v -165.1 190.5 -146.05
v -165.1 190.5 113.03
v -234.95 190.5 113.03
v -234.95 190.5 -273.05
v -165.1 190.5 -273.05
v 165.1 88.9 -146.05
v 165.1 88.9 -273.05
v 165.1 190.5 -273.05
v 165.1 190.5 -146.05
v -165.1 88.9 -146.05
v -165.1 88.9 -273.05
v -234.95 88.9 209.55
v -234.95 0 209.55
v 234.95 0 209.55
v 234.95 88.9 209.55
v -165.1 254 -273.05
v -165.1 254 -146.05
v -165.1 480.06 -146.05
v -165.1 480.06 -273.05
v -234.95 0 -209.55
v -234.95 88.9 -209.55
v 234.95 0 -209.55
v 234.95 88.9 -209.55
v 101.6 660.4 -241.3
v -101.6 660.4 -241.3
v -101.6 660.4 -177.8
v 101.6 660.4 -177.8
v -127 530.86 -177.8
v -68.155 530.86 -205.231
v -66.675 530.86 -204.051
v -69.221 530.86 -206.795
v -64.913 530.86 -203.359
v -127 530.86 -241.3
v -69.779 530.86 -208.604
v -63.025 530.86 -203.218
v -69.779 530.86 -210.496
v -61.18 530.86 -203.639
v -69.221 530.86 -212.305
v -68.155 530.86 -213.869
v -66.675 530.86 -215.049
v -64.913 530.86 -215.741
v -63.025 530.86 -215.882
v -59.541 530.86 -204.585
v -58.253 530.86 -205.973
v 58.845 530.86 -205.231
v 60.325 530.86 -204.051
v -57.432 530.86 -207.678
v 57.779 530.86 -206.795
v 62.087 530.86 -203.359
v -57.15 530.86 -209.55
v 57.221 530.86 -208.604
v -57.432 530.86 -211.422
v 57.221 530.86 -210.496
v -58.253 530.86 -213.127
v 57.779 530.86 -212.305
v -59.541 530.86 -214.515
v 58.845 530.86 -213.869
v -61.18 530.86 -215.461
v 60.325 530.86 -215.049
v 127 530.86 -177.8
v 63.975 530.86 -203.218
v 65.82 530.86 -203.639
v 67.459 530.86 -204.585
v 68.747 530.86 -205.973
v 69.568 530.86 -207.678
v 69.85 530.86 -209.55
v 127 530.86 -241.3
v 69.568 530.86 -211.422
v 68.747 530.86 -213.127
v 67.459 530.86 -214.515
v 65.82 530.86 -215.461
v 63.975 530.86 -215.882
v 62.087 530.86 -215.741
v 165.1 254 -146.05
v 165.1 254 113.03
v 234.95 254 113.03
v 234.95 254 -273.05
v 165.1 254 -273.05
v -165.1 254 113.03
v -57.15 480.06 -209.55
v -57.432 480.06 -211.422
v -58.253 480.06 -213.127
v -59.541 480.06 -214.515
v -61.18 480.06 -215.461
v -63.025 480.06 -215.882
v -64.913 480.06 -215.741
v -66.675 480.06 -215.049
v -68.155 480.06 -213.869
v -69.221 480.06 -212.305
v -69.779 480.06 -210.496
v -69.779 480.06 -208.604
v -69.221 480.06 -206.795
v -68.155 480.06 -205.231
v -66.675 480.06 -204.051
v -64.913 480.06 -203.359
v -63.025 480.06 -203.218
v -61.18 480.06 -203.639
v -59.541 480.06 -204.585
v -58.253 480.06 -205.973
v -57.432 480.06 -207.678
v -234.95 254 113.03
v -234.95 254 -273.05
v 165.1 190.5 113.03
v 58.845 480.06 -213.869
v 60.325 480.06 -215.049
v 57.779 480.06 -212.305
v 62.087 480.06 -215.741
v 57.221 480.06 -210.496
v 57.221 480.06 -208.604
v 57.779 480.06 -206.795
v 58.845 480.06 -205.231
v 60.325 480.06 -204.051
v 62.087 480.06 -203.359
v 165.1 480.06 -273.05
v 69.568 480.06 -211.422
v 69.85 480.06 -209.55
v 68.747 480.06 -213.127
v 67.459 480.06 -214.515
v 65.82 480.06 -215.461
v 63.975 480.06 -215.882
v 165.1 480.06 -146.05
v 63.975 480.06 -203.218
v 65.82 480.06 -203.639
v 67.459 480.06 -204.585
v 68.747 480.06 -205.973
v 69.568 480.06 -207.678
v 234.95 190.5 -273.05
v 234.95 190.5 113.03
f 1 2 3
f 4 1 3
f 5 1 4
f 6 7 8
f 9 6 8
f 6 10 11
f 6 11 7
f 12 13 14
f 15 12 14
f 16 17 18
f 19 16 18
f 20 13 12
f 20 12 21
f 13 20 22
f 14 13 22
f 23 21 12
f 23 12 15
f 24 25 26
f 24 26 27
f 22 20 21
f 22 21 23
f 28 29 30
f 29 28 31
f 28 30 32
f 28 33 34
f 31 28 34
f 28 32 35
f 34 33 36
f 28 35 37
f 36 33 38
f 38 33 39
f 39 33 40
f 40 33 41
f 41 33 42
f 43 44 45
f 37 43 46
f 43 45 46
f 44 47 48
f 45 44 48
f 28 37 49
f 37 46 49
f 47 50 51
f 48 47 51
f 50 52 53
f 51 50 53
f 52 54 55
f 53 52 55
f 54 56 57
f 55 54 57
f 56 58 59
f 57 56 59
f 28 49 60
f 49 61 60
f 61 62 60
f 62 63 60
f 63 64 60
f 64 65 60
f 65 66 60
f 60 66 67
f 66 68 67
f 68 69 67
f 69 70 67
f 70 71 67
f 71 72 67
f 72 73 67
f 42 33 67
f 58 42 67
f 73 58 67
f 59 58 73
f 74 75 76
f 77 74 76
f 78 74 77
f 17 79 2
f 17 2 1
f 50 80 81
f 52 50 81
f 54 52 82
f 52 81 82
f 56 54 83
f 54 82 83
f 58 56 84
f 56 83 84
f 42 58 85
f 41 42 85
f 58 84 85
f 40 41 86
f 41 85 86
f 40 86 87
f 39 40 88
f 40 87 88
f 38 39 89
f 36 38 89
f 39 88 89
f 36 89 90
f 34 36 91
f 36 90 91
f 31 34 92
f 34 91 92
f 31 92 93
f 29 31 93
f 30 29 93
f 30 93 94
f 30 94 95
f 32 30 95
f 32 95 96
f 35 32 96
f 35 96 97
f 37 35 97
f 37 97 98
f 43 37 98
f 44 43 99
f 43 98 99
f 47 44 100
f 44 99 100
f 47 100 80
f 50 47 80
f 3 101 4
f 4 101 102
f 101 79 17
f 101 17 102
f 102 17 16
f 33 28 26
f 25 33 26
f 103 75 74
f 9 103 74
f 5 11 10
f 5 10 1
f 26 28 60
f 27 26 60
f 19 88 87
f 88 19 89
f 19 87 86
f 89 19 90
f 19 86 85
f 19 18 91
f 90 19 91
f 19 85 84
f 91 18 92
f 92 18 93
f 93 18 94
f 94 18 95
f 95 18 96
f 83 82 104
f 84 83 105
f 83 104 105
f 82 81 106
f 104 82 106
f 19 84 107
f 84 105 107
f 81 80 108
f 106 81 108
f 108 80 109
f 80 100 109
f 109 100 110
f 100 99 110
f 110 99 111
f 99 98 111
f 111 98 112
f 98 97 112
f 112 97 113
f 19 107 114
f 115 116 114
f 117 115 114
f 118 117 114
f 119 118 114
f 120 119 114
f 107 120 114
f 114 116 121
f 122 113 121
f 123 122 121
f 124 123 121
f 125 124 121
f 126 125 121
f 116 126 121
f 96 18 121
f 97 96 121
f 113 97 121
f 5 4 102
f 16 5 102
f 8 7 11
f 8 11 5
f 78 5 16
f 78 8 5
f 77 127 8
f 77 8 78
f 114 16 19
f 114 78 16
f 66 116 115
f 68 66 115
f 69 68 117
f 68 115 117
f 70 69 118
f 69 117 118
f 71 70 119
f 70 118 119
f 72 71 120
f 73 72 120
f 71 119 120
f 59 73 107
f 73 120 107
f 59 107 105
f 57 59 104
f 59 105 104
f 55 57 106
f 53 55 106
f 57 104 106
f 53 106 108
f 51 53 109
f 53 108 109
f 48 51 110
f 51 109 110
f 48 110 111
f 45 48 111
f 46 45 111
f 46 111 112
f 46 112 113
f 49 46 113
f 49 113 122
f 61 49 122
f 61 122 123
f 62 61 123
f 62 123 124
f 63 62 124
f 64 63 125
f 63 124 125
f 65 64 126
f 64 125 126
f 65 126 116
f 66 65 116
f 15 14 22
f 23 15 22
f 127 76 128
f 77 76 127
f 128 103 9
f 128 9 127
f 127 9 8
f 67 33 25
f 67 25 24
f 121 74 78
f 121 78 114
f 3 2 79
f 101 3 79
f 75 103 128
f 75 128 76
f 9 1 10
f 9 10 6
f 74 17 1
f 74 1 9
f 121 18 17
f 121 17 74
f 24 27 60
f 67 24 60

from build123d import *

# Parameters (mm, degrees)
SKETCH1_W           = 469.9
SKETCH1_H           = 419.1
BOSS_EXTRUDE1_DEPTH = 88.9
SKETCH2_W           = 330.2
SKETCH2_H           = 391.16
BOSS_EXTRUDE2_DEPTH = 63.5
SKETCH3_W           = 386.08
SKETCH3_H           = 63.5
BOSS_EXTRUDE3_DEPTH = 69.85
SKETCH4_R           = 6.35
BOSS_EXTRUDE4_DEPTH = 50.8
SKETCH5_W           = 254
SKETCH5_H           = 63.5
BOSS_EXTRUDE5_DEPTH = 129.54
CUT_EXTRUDE1_DEPTH  = 129.54


with BuildPart() as part:
    # Sketch1 → Boss-Extrude1 (new body)
    with BuildSketch(Plane(origin=(0, 0, 0), x_dir=(1, 0, 0), z_dir=(0, 1, 0))):
        Rectangle(SKETCH1_W, SKETCH1_H)
    extrude(amount=BOSS_EXTRUDE1_DEPTH)


with BuildPart() as body_2:
    # Sketch2 → Boss-Extrude2 (new body, symmetric)
    with BuildSketch(Plane.XY.offset(-209.55)):
        with Locations((0, 284.48)):
            Rectangle(SKETCH2_W, SKETCH2_H)
    extrude(amount=BOSS_EXTRUDE2_DEPTH, both=True)

    # Sketch3 → Boss-Extrude3 (add)
    with BuildSketch(Plane(origin=(165.1, 0, 0), x_dir=(0, 0, -1), z_dir=(1, 0, 0))):
        with Locations((80.01, 222.25)):
            Rectangle(SKETCH3_W, SKETCH3_H)
    boss_extrude3 = extrude(amount=BOSS_EXTRUDE3_DEPTH)

    # Mirror1: Boss-Extrude3 across plane
    add(boss_extrude3.mirror(Plane(origin=(0, 0, 0), x_dir=(0, 0, 1), z_dir=(1, 0, 0))))

    # Sketch4 → Boss-Extrude4 (add)
    with BuildSketch(Plane(origin=(0, 480.06, 0), x_dir=(1, 0, 0), z_dir=(0, 1, 0))):
        with Locations((-63.5, 209.55)):
            Circle(SKETCH4_R)
        with Locations((63.5, 209.55)):
            Circle(SKETCH4_R)
    extrude(amount=BOSS_EXTRUDE4_DEPTH)

    # Sketch5 → Boss-Extrude5 (add)
    with BuildSketch(Plane(origin=(0, 530.86, 0), x_dir=(1, 0, 0), z_dir=(0, 1, 0))):
        with Locations((0, 209.55)):
            Rectangle(SKETCH5_W, SKETCH5_H)
    extrude(amount=BOSS_EXTRUDE5_DEPTH)

    # Sketch6 → Cut-Extrude1 (cut)
    with BuildSketch(Plane.XY.offset(-177.8)):
        Polygon((101.6, 660.4), (127, 530.86), (127, 660.4), align=None)
        Polygon((-127, 660.4), (-127, 530.86), (-101.6, 660.4), align=None)
    extrude(amount=-CUT_EXTRUDE1_DEPTH, mode=Mode.SUBTRACT)


solid = Compound([part.part, body_2.part])
